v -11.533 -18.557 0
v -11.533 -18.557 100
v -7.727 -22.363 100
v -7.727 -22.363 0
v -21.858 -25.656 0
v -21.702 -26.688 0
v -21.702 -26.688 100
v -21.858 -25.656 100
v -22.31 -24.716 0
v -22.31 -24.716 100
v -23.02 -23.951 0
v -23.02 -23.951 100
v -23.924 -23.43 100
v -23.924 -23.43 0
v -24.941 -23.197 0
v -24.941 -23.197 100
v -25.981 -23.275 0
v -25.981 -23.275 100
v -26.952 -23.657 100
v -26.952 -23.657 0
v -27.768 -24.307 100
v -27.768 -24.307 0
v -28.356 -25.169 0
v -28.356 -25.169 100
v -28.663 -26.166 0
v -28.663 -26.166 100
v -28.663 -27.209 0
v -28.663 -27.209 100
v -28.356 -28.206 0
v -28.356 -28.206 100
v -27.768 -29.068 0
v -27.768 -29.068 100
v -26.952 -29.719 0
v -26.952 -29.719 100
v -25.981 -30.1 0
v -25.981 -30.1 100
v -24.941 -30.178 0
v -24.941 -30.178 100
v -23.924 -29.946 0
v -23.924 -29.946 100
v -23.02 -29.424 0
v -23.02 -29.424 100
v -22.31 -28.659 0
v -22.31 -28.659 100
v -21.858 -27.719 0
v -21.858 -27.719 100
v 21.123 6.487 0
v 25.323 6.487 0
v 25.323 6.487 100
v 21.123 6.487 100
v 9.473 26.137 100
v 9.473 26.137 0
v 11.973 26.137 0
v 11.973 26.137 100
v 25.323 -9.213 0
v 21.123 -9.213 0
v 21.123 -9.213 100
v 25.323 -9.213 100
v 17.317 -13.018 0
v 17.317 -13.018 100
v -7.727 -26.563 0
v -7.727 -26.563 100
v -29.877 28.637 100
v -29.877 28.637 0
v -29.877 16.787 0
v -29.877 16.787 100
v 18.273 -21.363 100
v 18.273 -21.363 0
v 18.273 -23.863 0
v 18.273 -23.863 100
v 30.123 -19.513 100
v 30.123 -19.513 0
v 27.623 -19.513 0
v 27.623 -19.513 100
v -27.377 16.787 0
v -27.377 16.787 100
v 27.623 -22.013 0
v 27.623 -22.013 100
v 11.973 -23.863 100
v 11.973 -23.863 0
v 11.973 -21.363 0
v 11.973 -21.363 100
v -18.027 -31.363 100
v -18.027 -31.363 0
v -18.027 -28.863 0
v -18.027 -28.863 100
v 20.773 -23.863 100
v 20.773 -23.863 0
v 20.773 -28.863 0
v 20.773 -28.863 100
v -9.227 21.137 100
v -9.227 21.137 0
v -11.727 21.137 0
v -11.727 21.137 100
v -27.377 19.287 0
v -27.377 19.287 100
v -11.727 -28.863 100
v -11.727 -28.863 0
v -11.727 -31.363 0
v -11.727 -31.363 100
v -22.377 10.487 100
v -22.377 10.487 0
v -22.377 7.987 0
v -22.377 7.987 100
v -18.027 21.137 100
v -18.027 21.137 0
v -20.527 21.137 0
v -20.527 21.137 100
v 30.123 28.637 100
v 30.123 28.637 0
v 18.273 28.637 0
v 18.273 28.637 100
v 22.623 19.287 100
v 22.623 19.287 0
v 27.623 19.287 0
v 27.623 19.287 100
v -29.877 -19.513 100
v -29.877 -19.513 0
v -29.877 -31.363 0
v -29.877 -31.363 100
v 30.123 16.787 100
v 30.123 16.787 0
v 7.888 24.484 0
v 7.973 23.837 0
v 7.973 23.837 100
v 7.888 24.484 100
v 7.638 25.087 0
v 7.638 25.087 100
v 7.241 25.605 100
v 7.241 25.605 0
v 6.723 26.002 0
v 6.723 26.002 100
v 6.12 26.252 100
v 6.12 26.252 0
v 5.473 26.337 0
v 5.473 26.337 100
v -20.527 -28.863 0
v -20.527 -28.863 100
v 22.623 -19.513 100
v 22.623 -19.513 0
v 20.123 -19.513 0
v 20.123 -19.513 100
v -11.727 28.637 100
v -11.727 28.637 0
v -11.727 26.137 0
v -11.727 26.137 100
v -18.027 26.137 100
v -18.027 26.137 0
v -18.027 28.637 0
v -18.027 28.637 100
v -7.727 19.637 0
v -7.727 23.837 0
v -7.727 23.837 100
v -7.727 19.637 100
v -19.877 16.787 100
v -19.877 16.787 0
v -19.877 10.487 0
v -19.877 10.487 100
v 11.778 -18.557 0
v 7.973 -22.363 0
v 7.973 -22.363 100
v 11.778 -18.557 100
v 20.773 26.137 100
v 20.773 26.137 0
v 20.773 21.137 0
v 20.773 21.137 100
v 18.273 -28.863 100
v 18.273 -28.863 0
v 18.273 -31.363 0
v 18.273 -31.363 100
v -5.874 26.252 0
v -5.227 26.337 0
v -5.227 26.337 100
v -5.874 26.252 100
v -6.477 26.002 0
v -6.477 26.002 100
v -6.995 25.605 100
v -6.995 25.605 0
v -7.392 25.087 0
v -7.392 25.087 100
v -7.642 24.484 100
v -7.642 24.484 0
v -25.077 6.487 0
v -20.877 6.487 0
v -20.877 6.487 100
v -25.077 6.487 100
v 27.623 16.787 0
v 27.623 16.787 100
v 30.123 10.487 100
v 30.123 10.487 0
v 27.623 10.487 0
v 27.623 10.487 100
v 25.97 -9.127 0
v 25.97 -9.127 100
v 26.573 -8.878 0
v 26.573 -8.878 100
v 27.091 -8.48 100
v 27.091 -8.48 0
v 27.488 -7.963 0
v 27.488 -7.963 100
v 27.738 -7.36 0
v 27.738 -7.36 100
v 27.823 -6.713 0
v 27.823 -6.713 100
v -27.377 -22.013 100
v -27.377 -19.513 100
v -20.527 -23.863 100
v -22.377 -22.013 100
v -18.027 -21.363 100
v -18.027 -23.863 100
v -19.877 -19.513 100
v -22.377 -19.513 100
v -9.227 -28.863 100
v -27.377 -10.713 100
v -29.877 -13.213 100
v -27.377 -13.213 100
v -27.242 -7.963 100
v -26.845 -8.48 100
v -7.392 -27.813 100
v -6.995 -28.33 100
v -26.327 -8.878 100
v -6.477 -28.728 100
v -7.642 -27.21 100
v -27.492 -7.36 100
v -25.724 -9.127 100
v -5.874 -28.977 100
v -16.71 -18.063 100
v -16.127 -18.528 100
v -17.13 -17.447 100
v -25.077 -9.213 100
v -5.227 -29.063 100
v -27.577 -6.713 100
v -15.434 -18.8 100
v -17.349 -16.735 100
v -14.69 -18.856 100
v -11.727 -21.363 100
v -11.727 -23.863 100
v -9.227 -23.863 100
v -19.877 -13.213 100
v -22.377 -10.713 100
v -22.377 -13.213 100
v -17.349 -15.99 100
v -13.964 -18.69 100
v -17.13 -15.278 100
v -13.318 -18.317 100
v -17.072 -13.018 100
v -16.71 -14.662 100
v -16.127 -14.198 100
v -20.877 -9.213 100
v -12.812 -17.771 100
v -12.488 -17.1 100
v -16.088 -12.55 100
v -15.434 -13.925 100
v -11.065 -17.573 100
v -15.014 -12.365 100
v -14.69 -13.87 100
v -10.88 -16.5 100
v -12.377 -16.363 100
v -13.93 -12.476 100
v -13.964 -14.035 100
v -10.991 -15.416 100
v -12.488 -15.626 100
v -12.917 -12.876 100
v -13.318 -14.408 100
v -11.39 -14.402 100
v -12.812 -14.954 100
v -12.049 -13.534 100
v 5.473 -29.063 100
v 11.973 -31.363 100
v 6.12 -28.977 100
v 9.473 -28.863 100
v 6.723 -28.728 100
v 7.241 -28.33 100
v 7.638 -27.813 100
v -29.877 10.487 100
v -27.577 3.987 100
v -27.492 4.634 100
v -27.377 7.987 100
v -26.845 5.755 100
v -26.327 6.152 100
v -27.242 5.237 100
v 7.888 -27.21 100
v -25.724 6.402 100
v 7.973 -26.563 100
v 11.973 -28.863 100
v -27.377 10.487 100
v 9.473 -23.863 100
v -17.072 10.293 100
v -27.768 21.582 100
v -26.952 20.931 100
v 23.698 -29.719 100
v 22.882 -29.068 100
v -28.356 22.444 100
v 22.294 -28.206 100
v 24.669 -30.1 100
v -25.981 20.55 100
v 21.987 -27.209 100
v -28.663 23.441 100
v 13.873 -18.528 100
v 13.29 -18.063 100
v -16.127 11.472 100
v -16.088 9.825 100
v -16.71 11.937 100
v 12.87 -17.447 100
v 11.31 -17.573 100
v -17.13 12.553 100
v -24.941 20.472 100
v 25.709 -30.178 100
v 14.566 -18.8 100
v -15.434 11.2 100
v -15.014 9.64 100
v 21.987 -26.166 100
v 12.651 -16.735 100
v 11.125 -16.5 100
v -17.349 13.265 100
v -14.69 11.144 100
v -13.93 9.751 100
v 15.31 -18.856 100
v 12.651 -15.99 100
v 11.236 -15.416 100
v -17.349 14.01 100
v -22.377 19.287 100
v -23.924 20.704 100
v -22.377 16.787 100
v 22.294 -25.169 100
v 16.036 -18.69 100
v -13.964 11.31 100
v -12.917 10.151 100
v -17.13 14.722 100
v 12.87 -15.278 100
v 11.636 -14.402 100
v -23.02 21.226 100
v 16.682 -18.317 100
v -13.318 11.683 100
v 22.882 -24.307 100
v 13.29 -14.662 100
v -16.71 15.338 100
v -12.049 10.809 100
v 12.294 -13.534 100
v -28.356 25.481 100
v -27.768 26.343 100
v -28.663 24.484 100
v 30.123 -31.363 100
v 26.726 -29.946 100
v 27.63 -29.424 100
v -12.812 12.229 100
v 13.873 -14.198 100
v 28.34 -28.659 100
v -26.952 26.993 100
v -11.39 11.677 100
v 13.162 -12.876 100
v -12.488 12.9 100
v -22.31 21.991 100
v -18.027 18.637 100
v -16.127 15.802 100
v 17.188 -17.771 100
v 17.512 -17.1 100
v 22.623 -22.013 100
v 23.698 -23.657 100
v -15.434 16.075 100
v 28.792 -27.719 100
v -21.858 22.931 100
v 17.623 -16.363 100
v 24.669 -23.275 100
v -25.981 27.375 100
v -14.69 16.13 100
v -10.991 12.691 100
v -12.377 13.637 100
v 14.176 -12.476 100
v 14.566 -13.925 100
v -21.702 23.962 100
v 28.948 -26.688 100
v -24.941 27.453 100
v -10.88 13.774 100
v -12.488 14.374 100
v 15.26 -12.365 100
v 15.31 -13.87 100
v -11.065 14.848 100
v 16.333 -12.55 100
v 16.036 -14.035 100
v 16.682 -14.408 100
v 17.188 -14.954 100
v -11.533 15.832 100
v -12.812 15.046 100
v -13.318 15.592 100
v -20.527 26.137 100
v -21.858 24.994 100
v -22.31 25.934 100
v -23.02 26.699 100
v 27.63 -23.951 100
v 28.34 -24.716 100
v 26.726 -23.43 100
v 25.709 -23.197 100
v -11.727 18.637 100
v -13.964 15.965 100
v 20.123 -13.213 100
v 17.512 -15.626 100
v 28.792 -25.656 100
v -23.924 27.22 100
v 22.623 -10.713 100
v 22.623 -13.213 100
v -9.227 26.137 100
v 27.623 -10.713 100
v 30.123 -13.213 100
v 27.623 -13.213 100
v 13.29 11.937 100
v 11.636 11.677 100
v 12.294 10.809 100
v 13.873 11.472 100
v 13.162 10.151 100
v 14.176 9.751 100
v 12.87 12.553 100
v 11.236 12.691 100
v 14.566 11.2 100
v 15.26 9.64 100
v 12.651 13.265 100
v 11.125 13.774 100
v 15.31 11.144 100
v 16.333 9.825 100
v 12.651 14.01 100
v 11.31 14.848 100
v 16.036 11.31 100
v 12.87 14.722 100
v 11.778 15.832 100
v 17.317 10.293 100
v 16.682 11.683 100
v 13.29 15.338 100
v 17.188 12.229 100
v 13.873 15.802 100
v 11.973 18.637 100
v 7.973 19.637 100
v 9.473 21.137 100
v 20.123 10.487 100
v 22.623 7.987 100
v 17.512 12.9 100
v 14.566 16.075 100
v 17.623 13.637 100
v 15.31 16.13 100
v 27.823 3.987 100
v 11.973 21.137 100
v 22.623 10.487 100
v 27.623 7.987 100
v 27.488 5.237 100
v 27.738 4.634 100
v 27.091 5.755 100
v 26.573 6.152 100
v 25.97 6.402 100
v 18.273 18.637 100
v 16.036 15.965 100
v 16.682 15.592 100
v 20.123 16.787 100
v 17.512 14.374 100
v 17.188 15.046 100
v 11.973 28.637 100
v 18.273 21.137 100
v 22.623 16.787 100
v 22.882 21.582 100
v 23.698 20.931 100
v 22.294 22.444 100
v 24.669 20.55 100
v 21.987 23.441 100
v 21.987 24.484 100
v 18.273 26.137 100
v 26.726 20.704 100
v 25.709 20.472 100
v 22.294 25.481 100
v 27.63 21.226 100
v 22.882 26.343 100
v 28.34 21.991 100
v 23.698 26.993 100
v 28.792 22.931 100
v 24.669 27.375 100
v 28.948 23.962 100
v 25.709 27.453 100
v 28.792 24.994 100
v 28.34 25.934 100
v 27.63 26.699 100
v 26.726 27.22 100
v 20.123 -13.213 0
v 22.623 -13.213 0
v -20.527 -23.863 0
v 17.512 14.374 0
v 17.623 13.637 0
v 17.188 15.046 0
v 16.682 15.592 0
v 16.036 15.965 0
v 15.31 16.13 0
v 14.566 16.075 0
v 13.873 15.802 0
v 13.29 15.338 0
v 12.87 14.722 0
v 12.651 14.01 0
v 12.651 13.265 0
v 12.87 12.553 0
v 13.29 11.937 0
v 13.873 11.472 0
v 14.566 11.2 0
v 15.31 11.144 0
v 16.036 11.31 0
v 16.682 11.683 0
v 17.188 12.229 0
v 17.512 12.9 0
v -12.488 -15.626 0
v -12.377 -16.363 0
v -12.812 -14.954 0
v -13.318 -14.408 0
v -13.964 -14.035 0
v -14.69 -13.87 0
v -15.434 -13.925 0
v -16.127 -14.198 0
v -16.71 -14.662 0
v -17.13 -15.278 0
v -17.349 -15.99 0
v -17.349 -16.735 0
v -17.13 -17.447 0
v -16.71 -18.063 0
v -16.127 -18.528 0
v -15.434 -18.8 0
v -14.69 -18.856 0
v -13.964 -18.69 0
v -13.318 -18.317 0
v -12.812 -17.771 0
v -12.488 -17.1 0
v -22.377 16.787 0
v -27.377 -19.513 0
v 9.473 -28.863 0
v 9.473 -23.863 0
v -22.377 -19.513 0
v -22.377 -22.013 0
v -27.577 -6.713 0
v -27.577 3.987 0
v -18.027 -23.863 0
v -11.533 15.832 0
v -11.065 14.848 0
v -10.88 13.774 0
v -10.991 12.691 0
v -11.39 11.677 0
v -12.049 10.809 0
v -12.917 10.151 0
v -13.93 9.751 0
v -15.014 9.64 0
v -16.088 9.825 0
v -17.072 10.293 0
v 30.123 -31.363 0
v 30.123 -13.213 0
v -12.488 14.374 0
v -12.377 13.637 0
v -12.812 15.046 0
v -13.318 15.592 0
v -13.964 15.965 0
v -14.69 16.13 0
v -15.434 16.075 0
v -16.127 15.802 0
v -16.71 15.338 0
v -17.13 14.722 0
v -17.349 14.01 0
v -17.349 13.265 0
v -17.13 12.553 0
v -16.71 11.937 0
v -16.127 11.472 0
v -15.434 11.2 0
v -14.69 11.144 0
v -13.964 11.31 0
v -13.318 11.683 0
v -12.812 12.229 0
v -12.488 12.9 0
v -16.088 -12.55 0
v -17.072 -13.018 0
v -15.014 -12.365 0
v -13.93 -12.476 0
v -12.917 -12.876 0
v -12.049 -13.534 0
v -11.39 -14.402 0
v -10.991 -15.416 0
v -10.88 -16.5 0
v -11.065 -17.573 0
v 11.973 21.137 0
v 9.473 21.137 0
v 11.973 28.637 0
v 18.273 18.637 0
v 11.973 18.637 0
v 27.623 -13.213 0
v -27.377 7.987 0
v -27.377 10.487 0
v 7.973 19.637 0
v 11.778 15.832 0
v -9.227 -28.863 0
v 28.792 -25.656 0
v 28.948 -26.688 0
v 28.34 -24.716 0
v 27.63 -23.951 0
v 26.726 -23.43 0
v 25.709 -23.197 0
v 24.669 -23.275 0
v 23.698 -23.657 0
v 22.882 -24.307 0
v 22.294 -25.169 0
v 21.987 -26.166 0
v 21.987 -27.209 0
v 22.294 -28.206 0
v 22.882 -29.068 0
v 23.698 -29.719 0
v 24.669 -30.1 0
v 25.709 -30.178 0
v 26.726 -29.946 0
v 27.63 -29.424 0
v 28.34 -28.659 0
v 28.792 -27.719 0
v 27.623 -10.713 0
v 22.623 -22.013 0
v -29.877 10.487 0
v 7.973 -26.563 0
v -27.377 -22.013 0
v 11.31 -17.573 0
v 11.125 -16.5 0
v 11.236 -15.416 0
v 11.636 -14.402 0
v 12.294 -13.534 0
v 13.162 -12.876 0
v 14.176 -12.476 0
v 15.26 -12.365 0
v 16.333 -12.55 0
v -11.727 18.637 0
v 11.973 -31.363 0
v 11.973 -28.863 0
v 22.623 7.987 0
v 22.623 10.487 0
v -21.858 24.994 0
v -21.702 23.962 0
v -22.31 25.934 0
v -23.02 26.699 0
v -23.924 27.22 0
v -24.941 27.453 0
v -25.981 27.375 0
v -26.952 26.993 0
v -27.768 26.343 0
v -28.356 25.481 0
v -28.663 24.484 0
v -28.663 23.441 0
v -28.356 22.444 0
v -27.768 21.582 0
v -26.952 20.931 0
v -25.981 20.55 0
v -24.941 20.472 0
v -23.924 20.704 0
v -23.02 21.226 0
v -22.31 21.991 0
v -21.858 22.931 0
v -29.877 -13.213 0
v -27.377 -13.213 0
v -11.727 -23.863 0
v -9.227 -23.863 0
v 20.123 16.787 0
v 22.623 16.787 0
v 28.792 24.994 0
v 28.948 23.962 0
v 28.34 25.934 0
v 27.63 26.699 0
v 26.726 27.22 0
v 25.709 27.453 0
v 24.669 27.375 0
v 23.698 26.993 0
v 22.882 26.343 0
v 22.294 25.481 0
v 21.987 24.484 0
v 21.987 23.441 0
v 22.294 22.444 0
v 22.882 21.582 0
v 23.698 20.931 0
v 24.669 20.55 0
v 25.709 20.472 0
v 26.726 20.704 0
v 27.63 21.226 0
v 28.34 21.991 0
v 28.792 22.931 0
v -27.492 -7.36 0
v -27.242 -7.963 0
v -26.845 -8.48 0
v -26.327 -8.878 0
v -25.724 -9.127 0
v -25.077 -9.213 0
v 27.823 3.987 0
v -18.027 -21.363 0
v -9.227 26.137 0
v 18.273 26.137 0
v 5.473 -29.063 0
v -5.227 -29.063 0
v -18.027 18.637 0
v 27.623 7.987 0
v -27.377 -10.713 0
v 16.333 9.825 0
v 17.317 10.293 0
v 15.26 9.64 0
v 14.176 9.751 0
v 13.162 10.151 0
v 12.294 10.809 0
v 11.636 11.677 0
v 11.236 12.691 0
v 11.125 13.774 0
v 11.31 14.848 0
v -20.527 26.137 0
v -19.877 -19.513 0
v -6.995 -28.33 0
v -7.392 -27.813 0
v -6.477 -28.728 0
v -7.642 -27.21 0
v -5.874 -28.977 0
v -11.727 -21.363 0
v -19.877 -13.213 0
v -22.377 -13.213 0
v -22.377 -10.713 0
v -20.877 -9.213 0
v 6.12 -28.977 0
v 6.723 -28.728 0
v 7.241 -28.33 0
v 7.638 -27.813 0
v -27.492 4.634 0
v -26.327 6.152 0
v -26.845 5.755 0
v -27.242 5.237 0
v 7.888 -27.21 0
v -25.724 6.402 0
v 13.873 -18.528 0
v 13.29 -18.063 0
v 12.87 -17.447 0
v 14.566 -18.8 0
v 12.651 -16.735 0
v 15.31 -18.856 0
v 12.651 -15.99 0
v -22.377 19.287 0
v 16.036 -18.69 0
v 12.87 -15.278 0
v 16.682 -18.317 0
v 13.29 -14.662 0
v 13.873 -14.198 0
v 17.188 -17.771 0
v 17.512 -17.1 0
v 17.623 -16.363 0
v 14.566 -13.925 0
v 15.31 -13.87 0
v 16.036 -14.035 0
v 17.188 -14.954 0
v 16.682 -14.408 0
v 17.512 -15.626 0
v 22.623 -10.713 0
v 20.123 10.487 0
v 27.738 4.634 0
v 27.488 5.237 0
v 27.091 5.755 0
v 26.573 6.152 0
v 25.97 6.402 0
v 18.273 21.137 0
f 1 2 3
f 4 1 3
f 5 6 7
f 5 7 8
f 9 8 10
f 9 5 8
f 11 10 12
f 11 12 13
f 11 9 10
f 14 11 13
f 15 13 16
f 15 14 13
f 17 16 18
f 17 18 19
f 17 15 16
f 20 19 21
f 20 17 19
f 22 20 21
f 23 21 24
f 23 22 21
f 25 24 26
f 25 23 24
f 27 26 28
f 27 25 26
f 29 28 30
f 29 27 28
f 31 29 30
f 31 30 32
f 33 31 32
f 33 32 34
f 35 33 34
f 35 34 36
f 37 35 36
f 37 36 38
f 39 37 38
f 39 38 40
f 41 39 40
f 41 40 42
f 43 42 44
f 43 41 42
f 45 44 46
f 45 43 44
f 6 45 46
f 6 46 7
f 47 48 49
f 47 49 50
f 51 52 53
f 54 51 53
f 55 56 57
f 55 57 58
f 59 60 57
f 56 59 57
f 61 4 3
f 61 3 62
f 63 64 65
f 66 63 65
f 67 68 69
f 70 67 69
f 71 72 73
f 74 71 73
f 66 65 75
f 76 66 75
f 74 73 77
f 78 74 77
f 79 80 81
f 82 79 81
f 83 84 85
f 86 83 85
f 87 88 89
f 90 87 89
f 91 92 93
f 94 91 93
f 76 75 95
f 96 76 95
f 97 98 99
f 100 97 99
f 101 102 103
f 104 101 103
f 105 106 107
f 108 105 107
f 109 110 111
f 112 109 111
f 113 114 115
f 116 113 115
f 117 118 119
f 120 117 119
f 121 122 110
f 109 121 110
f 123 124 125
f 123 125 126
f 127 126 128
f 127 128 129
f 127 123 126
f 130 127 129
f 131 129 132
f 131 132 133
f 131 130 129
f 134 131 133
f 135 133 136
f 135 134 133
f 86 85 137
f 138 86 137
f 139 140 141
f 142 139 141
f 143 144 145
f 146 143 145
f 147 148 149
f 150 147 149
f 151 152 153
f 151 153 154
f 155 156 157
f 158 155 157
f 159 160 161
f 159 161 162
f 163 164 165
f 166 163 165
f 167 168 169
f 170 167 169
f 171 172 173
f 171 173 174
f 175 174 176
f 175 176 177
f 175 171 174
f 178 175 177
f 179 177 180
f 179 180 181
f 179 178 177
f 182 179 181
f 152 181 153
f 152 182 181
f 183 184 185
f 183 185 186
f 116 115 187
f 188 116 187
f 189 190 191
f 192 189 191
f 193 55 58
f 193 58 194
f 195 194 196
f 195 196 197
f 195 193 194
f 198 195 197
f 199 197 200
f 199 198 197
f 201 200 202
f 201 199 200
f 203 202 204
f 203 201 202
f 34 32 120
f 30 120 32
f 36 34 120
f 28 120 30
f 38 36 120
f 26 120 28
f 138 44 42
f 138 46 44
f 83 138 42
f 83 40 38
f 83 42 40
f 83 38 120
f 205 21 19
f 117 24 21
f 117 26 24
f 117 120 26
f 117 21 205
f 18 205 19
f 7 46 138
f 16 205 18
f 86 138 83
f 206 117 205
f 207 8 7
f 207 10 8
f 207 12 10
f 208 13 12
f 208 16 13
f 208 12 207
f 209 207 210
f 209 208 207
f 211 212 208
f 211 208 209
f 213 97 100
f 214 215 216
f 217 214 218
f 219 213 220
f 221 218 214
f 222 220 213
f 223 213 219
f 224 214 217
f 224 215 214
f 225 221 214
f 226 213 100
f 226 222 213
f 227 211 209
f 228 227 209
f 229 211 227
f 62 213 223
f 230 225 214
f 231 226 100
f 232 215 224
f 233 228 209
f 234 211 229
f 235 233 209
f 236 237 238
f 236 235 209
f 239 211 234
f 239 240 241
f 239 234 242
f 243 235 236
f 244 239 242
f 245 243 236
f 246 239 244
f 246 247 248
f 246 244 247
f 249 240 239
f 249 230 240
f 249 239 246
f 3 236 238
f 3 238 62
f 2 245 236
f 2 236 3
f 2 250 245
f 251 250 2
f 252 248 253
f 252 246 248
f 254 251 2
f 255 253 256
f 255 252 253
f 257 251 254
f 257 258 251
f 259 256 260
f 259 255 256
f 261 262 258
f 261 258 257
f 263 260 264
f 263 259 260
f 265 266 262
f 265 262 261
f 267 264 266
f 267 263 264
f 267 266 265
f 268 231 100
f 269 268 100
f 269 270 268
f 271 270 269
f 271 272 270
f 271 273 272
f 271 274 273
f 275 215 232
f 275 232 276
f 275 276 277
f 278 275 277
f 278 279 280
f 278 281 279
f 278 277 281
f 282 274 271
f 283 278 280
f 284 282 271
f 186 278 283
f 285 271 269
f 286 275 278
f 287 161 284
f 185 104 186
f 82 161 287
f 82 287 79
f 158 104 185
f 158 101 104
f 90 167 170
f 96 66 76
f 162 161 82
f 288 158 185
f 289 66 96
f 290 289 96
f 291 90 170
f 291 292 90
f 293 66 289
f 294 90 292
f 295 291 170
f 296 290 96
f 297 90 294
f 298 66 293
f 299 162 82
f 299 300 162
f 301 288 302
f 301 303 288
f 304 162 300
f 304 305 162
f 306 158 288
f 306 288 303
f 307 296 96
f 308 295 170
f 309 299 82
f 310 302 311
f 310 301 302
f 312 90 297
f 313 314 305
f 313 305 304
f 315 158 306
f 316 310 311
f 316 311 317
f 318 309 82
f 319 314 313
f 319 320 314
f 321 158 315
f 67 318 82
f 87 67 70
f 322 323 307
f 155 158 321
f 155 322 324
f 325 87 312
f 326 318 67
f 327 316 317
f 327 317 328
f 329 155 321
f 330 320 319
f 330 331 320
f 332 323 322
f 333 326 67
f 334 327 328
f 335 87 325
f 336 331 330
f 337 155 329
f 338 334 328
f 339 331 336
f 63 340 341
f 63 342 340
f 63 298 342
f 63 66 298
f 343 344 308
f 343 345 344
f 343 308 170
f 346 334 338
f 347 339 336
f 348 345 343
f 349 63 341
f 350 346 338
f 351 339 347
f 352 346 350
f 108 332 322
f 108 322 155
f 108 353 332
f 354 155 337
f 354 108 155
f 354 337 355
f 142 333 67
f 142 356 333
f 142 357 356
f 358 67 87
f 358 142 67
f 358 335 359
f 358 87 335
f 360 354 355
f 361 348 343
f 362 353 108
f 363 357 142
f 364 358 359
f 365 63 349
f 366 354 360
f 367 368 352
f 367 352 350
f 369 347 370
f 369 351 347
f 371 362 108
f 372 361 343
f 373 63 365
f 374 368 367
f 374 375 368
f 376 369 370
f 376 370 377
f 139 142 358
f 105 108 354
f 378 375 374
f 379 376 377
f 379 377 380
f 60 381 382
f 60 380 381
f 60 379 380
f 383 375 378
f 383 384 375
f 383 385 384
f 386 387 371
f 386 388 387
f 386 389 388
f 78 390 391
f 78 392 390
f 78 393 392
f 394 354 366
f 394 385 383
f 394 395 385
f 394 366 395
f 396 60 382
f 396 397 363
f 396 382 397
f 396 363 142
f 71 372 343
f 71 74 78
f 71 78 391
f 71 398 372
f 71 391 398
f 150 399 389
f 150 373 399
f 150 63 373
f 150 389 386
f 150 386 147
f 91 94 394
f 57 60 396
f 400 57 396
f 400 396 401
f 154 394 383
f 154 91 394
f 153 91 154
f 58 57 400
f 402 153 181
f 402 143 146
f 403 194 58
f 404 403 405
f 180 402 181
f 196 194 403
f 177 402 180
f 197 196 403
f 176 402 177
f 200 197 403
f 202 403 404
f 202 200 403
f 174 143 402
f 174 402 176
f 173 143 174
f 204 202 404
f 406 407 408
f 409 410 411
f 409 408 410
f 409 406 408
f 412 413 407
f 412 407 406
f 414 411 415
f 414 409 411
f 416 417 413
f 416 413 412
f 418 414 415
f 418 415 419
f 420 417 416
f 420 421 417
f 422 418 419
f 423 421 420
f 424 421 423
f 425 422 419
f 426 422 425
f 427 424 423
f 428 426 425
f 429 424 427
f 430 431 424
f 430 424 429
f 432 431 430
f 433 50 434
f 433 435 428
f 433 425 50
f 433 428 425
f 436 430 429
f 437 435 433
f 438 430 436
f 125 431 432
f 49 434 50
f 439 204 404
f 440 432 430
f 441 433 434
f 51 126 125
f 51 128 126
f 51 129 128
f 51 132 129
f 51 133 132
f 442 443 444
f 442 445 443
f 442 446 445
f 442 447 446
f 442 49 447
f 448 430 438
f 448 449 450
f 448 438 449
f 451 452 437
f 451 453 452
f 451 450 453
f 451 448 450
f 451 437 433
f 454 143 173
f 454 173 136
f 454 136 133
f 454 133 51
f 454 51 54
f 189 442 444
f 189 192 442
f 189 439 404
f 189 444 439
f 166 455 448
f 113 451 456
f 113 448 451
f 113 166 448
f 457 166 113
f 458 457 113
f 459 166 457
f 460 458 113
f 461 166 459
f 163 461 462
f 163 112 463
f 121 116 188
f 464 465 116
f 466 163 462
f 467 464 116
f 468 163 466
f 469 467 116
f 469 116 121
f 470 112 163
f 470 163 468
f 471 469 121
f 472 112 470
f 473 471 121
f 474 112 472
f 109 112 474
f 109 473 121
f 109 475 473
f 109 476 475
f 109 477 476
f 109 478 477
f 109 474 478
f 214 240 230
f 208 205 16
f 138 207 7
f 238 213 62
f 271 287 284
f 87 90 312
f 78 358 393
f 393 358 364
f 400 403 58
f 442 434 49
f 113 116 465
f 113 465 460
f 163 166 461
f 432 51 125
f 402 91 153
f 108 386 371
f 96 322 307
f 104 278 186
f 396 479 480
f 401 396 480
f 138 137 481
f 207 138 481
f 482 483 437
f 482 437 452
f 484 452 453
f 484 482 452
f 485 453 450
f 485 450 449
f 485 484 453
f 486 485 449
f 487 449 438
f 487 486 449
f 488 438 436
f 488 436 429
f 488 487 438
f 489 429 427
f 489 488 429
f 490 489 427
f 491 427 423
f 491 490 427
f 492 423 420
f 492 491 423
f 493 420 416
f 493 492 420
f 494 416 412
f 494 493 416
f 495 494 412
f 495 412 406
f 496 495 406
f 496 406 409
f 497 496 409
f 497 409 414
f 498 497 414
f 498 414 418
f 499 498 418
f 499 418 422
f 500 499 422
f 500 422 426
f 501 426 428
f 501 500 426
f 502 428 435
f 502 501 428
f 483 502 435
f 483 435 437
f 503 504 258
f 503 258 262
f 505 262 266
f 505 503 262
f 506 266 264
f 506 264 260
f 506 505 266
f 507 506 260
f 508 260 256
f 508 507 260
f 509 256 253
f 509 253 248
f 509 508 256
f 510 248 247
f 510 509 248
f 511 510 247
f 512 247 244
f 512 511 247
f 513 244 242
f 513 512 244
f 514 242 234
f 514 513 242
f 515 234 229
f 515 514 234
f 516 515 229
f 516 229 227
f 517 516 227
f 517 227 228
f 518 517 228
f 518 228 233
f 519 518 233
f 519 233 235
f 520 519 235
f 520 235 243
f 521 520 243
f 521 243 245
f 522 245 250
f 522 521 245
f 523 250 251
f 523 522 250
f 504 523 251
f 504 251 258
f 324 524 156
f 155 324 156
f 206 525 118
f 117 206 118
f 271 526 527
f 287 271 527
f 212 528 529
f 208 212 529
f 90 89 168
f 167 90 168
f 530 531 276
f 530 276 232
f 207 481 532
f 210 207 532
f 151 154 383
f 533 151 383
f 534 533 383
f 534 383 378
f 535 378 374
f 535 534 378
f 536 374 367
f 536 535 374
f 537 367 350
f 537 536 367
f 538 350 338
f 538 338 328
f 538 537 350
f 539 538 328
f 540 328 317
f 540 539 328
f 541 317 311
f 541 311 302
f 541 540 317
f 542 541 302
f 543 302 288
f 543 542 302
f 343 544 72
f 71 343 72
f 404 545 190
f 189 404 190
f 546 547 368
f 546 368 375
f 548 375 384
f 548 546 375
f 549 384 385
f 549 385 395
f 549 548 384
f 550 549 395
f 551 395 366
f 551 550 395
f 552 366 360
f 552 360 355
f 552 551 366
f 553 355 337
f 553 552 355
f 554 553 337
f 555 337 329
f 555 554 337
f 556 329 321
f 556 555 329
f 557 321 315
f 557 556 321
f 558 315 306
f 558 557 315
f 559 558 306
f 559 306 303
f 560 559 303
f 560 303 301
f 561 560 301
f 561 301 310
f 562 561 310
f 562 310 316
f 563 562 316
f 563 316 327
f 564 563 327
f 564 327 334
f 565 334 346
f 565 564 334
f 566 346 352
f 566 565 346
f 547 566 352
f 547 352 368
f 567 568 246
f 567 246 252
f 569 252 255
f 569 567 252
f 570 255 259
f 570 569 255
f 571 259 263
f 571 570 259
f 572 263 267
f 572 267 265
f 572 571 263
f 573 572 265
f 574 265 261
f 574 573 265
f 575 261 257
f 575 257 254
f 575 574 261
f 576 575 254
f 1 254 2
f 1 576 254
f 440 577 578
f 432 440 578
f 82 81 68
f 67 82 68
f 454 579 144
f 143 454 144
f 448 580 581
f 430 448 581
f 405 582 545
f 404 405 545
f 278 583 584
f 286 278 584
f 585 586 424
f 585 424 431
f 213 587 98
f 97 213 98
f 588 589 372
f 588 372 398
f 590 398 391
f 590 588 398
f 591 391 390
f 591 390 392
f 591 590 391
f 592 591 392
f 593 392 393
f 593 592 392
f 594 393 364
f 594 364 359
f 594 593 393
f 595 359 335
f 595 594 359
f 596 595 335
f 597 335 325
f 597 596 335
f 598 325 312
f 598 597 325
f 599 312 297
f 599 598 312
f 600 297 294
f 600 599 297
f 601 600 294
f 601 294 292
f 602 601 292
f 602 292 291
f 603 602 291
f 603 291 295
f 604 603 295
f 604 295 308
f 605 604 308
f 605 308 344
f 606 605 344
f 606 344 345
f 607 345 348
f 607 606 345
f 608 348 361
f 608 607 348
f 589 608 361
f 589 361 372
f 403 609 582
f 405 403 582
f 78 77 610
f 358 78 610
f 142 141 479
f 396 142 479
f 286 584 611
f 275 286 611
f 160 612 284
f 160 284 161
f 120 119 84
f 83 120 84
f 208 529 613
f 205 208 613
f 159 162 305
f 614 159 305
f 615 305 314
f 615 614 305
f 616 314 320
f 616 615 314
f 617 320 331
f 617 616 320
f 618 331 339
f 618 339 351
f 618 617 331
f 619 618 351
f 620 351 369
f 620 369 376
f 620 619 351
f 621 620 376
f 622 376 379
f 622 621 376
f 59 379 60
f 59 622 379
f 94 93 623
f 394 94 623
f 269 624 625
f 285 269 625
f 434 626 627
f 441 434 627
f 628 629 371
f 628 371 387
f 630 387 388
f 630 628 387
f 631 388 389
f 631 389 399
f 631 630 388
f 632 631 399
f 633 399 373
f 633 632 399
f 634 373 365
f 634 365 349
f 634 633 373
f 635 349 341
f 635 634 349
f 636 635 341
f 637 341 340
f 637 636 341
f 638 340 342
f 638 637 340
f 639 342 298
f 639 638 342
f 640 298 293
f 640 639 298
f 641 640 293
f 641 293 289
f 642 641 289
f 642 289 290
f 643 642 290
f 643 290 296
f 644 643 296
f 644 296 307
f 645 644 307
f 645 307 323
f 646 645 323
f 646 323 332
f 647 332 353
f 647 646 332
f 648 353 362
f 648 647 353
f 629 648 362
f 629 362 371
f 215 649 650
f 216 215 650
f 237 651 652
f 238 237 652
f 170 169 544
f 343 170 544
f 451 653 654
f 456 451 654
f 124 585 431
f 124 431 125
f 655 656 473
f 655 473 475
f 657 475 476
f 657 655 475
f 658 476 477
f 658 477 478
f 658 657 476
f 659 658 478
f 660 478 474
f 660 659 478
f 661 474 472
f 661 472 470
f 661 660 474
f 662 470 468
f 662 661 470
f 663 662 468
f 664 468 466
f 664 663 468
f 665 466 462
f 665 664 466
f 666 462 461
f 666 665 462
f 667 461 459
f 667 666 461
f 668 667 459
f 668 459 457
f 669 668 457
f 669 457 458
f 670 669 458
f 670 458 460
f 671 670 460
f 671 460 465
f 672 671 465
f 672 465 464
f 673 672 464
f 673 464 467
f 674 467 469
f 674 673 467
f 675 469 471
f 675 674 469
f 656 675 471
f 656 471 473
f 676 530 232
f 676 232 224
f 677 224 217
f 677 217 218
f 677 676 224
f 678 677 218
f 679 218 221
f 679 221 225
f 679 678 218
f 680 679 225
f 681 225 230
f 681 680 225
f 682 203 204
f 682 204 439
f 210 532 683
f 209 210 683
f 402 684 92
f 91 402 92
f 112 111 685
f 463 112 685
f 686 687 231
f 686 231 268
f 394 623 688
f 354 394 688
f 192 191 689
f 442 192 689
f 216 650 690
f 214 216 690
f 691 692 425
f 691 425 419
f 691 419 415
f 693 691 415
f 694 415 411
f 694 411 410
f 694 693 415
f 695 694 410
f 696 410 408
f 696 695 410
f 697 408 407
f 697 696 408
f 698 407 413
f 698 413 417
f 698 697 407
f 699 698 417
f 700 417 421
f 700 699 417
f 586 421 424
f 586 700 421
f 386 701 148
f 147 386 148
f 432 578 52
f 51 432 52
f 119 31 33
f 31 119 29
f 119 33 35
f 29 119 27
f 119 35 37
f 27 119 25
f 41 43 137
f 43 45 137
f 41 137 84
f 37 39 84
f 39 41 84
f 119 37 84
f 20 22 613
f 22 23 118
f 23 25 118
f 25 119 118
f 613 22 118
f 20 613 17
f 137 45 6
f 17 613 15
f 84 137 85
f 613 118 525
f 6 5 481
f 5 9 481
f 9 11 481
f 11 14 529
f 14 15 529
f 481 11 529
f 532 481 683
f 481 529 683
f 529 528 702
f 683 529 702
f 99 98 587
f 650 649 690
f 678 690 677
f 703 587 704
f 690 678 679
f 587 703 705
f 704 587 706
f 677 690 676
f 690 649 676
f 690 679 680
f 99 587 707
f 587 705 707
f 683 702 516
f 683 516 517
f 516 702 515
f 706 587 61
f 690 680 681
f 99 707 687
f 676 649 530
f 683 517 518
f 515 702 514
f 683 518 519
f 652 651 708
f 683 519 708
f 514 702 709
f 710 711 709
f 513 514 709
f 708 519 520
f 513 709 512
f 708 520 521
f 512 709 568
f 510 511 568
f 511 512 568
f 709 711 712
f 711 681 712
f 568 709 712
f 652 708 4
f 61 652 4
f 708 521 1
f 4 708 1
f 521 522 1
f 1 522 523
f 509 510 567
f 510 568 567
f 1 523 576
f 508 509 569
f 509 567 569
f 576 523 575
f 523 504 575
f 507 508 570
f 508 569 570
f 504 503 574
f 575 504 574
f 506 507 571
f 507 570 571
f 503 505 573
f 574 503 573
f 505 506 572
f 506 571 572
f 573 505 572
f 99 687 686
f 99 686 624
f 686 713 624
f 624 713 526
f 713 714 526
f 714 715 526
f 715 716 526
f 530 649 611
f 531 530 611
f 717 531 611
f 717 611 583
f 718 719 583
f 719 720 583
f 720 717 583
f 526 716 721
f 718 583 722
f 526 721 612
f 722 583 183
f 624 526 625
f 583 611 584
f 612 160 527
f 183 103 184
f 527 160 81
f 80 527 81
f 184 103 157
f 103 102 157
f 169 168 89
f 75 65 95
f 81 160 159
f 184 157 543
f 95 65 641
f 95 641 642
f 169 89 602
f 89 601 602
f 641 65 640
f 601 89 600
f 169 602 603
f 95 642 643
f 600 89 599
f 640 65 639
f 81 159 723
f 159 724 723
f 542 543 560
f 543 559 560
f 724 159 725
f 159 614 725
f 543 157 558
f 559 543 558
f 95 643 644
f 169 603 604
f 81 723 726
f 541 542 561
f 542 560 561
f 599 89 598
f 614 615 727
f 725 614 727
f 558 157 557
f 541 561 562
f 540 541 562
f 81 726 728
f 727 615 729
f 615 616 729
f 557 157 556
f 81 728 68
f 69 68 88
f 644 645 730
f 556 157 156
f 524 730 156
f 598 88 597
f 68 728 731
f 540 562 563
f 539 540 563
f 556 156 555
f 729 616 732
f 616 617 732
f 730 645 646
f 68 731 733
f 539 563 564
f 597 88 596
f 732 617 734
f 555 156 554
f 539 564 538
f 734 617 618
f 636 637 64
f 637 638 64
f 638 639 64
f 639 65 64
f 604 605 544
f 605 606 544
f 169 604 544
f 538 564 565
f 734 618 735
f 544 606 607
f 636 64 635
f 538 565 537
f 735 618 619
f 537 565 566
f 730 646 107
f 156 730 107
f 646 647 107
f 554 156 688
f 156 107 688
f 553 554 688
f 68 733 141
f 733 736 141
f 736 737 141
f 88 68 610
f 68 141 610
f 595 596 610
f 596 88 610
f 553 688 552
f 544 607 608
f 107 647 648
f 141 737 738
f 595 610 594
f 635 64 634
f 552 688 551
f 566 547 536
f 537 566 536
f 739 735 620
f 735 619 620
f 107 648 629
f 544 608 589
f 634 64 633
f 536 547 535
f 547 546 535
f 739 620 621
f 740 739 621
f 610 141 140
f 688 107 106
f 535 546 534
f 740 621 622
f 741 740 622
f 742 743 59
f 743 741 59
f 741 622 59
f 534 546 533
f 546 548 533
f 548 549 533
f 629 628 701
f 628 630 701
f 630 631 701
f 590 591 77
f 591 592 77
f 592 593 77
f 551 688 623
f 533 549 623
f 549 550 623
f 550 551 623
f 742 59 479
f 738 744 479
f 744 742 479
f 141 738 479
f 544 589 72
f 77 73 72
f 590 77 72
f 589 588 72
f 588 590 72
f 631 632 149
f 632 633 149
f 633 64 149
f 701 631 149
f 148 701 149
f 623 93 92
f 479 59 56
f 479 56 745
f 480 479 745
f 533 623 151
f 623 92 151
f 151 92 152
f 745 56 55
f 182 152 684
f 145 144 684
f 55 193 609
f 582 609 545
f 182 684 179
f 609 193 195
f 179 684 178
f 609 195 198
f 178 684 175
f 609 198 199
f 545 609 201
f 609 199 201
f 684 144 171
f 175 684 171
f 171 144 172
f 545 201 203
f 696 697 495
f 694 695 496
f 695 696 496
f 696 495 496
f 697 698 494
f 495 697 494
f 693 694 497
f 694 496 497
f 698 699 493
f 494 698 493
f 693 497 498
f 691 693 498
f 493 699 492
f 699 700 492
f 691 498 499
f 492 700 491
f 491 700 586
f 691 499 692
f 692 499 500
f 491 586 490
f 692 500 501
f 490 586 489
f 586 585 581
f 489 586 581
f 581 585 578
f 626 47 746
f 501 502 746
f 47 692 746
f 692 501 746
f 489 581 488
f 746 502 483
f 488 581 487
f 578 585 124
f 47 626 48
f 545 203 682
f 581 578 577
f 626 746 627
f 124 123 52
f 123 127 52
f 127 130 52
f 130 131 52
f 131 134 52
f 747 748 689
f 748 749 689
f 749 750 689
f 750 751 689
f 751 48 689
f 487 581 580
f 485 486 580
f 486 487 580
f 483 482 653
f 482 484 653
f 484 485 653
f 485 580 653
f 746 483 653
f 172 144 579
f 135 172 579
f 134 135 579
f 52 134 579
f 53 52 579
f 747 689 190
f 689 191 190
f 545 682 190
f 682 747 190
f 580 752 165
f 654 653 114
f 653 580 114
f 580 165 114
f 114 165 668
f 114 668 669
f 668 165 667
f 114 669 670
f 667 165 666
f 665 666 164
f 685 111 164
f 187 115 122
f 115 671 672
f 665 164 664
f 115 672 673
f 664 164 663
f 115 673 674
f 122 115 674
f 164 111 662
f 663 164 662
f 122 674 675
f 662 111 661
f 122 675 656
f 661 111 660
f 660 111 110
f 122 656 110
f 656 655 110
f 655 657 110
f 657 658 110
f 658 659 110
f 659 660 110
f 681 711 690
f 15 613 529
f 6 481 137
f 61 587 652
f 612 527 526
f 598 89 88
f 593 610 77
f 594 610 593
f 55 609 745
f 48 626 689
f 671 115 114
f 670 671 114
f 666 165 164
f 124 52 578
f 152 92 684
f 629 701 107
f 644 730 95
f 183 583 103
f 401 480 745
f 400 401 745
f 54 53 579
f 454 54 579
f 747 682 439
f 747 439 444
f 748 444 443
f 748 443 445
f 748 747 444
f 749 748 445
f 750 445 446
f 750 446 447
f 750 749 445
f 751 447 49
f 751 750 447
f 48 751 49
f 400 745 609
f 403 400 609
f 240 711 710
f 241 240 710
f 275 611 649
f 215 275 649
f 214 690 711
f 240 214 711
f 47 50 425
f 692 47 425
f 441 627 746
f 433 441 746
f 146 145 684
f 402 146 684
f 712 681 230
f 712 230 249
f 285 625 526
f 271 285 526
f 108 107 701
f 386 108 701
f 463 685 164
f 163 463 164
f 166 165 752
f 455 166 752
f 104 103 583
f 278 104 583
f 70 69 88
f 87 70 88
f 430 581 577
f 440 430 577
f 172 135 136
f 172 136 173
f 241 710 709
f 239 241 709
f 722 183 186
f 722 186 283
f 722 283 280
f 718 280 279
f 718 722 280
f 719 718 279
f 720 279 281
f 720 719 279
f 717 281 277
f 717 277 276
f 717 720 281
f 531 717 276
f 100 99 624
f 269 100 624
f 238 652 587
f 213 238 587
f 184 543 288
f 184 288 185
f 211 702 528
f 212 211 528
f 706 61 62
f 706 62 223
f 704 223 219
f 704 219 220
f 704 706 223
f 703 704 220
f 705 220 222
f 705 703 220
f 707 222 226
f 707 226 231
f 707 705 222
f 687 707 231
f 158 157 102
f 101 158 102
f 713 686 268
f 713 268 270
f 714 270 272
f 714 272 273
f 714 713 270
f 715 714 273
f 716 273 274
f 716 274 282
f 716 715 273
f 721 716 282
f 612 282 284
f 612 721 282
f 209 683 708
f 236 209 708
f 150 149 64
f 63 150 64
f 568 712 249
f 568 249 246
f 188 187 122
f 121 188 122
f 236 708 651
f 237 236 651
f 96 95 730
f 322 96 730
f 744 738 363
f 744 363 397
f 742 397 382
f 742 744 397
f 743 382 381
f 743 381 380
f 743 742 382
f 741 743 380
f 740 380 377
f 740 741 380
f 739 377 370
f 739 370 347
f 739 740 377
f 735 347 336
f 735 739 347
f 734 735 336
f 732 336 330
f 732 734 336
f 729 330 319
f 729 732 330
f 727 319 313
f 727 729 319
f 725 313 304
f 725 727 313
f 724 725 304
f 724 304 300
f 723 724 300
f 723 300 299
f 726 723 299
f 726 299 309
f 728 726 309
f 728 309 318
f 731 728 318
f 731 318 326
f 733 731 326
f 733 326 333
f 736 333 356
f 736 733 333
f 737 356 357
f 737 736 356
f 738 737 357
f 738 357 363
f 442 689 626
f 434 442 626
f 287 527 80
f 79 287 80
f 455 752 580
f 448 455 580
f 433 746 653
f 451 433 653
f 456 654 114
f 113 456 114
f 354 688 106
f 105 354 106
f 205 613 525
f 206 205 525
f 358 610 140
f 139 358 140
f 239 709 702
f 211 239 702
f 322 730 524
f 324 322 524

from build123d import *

# Parameters (mm, degrees)
SKETCH_1_R      = 2.5
SKETCH_1_R_2    = 3.5
EXTRUDE_1_DEPTH = 100


with BuildPart() as part:
    # 草图1 → 凸台-拉伸1 (new body)
    with BuildSketch(Plane.XY):
        Polygon((-29.877197952, 10.487377279), (-29.877197952, -1.362622721), (-29.877197952, -13.212622721), (-27.377197952, -13.212622721), (-27.377197952, -10.712622721), (-22.377197952, -10.712622721), (-22.377197952, -13.212622721), (-19.877197952, -13.212622721), (-19.877197952, -19.512622721), (-22.377197952, -19.512622721), (-22.377197952, -22.012622721), (-27.377197952, -22.012622721), (-27.377197952, -19.512622721), (-29.877197952, -19.512622721), (-29.877197952, -31.362622721), (-18.027197952, -31.362622721), (-18.027197952, -28.862622721), (-20.527197952, -28.862622721), (-20.527197952, -23.862622721), (-18.027197952, -23.862622721), (-18.027197952, -21.362622721), (-11.727197952, -21.362622721), (-11.727197952, -23.862622721), (-9.227197952, -23.862622721), (-9.227197952, -28.862622721), (-11.727197952, -28.862622721), (-11.727197952, -31.362622721), (0.122802048, -31.362622721), (11.972802048, -31.362622721), (11.972802048, -28.862622721), (9.472802048, -28.862622721), (9.472802048, -23.862622721), (11.972802048, -23.862622721), (11.972802048, -21.362622721), (18.272802048, -21.362622721), (18.272802048, -23.862622721), (20.772802048, -23.862622721), (20.772802048, -28.862622721), (18.272802048, -28.862622721), (18.272802048, -31.362622721), (30.122802048, -31.362622721), (30.122802048, -19.512622721), (27.622802048, -19.512622721), (27.622802048, -22.012622721), (22.622802048, -22.012622721), (22.622802048, -19.512622721), (20.122802048, -19.512622721), (20.122802048, -13.212622721), (22.622802048, -13.212622721), (22.622802048, -10.712622721), (27.622802048, -10.712622721), (27.622802048, -13.212622721), (30.122802048, -13.212622721), (30.122802048, -1.362622721), (30.122802048, 10.487377279), (27.622802048, 10.487377279), (27.622802048, 7.987377279), (22.622802048, 7.987377279), (22.622802048, 10.487377279), (20.122802048, 10.487377279), (20.122802048, 16.787377279), (22.622802048, 16.787377279), (22.622802048, 19.287377279), (27.622802048, 19.287377279), (27.622802048, 16.787377279), (30.122802048, 16.787377279), (30.122802048, 28.637377279), (18.272802048, 28.637377279), (18.272802048, 26.137377279), (20.772802048, 26.137377279), (20.772802048, 21.137377279), (18.272802048, 21.137377279), (18.272802048, 18.637377279), (11.972802048, 18.637377279), (11.972802048, 21.137377279), (9.472802048, 21.137377279), (9.472802048, 26.137377279), (11.972802048, 26.137377279), (11.972802048, 28.637377279), (0.122802048, 28.637377279), (-11.727197952, 28.637377279), (-11.727197952, 26.137377279), (-9.227197952, 26.137377279), (-9.227197952, 21.137377279), (-11.727197952, 21.137377279), (-11.727197952, 18.637377279), (-18.027197952, 18.637377279), (-18.027197952, 21.137377279), (-20.527197952, 21.137377279), (-20.527197952, 26.137377279), (-18.027197952, 26.137377279), (-18.027197952, 28.637377279), (-29.877197952, 28.637377279), (-29.877197952, 16.787377279), (-27.377197952, 16.787377279), (-27.377197952, 19.287377279), (-22.377197952, 19.287377279), (-22.377197952, 16.787377279), (-19.877197952, 16.787377279), (-19.877197952, 10.487377279), (-22.377197952, 10.487377279), (-22.377197952, 7.987377279), (-27.377197952, 7.987377279), (-27.377197952, 10.487377279), align=None)
        with Locations((-14.877197952, 13.637377279)):
            Circle(SKETCH_1_R, mode=Mode.SUBTRACT)
        with Locations((-25.202197952, 23.962377279)):
            Circle(SKETCH_1_R_2, mode=Mode.SUBTRACT)
        with Locations((15.122802048, 13.637377279)):
            Circle(SKETCH_1_R, mode=Mode.SUBTRACT)
        with Locations((25.447802048, 23.962377279)):
            Circle(SKETCH_1_R_2, mode=Mode.SUBTRACT)
        with Locations((-14.877197952, -16.362622721)):
            Circle(SKETCH_1_R, mode=Mode.SUBTRACT)
        with Locations((-25.202197952, -26.687622721)):
            Circle(SKETCH_1_R_2, mode=Mode.SUBTRACT)
        with Locations((15.122802048, -16.362622721)):
            Circle(SKETCH_1_R, mode=Mode.SUBTRACT)
        with Locations((25.447802048, -26.687622721)):
            Circle(SKETCH_1_R_2, mode=Mode.SUBTRACT)
        with BuildLine():
            Line((0.122802048, 26.337377279), (-5.227197952, 26.337377279))
            ThreePointArc((-5.227197952, 26.337377279), (-6.994964905, 25.605144232), (-7.727197952, 23.837377279))
            Line((-7.727197952, 23.837377279), (-7.727197952, 19.637377279))
            Line((-7.727197952, 19.637377279), (-11.532834307, 15.831740924))
            ThreePointArc((-11.532834307, 15.831740924), (-12.048770828, 10.808950154), (-17.071561598, 10.293013634))
            Line((-17.071561598, 10.293013634), (-20.877197952, 6.487377279))
            Line((-20.877197952, 6.487377279), (-25.077197952, 6.487377279))
            ThreePointArc((-25.077197952, 6.487377279), (-26.844964905, 5.755144232), (-27.577197952, 3.987377279))
            Line((-27.577197952, 3.987377279), (-27.577197952, -6.712622721))
            ThreePointArc((-27.577197952, -6.712622721), (-26.844964905, -8.480389674), (-25.077197952, -9.212622721))
            Line((-25.077197952, -9.212622721), (-20.877197952, -9.212622721))
            Line((-20.877197952, -9.212622721), (-17.071561598, -13.018259076))
            ThreePointArc((-17.071561598, -13.018259076), (-12.048770828, -13.534195596), (-11.532834307, -18.556986366))
            Line((-11.532834307, -18.556986366), (-7.727197952, -22.362622721))
            Line((-7.727197952, -22.362622721), (-7.727197952, -26.562622721))
            ThreePointArc((-7.727197952, -26.562622721), (-6.994964905, -28.330389674), (-5.227197952, -29.062622721))
            Line((-5.227197952, -29.062622721), (0.122802048, -29.062622721))
            Line((0.122802048, -29.062622721), (5.472802048, -29.062622721))
            ThreePointArc((5.472802048, -29.062622721), (7.240569001, -28.330389674), (7.972802048, -26.562622721))
            Line((7.972802048, -26.562622721), (7.972802048, -22.362622721))
            Line((7.972802048, -22.362622721), (11.778438402, -18.556986366))
            ThreePointArc((11.778438402, -18.556986366), (12.294374923, -13.534195596), (17.317165693, -13.018259076))
            Line((17.317165693, -13.018259076), (21.122802048, -9.212622721))
            Line((21.122802048, -9.212622721), (25.322802048, -9.212622721))
            ThreePointArc((25.322802048, -9.212622721), (27.090569001, -8.480389674), (27.822802048, -6.712622721))
            Line((27.822802048, -6.712622721), (27.822802048, 3.987377279))
            ThreePointArc((27.822802048, 3.987377279), (27.090569001, 5.755144232), (25.322802048, 6.487377279))
            Line((25.322802048, 6.487377279), (21.122802048, 6.487377279))
            Line((21.122802048, 6.487377279), (17.317165693, 10.293013634))
            ThreePointArc((17.317165693, 10.293013634), (12.294374923, 10.808950154), (11.778438402, 15.831740924))
            Line((11.778438402, 15.831740924), (7.972802048, 19.637377279))
            Line((7.972802048, 19.637377279), (7.972802048, 23.837377279))
            ThreePointArc((7.972802048, 23.837377279), (7.240569001, 25.605144232), (5.472802048, 26.337377279))
            Line((5.472802048, 26.337377279), (0.122802048, 26.337377279))
        make_face(mode=Mode.SUBTRACT)
    extrude(amount=EXTRUDE_1_DEPTH)


solid = part.part
